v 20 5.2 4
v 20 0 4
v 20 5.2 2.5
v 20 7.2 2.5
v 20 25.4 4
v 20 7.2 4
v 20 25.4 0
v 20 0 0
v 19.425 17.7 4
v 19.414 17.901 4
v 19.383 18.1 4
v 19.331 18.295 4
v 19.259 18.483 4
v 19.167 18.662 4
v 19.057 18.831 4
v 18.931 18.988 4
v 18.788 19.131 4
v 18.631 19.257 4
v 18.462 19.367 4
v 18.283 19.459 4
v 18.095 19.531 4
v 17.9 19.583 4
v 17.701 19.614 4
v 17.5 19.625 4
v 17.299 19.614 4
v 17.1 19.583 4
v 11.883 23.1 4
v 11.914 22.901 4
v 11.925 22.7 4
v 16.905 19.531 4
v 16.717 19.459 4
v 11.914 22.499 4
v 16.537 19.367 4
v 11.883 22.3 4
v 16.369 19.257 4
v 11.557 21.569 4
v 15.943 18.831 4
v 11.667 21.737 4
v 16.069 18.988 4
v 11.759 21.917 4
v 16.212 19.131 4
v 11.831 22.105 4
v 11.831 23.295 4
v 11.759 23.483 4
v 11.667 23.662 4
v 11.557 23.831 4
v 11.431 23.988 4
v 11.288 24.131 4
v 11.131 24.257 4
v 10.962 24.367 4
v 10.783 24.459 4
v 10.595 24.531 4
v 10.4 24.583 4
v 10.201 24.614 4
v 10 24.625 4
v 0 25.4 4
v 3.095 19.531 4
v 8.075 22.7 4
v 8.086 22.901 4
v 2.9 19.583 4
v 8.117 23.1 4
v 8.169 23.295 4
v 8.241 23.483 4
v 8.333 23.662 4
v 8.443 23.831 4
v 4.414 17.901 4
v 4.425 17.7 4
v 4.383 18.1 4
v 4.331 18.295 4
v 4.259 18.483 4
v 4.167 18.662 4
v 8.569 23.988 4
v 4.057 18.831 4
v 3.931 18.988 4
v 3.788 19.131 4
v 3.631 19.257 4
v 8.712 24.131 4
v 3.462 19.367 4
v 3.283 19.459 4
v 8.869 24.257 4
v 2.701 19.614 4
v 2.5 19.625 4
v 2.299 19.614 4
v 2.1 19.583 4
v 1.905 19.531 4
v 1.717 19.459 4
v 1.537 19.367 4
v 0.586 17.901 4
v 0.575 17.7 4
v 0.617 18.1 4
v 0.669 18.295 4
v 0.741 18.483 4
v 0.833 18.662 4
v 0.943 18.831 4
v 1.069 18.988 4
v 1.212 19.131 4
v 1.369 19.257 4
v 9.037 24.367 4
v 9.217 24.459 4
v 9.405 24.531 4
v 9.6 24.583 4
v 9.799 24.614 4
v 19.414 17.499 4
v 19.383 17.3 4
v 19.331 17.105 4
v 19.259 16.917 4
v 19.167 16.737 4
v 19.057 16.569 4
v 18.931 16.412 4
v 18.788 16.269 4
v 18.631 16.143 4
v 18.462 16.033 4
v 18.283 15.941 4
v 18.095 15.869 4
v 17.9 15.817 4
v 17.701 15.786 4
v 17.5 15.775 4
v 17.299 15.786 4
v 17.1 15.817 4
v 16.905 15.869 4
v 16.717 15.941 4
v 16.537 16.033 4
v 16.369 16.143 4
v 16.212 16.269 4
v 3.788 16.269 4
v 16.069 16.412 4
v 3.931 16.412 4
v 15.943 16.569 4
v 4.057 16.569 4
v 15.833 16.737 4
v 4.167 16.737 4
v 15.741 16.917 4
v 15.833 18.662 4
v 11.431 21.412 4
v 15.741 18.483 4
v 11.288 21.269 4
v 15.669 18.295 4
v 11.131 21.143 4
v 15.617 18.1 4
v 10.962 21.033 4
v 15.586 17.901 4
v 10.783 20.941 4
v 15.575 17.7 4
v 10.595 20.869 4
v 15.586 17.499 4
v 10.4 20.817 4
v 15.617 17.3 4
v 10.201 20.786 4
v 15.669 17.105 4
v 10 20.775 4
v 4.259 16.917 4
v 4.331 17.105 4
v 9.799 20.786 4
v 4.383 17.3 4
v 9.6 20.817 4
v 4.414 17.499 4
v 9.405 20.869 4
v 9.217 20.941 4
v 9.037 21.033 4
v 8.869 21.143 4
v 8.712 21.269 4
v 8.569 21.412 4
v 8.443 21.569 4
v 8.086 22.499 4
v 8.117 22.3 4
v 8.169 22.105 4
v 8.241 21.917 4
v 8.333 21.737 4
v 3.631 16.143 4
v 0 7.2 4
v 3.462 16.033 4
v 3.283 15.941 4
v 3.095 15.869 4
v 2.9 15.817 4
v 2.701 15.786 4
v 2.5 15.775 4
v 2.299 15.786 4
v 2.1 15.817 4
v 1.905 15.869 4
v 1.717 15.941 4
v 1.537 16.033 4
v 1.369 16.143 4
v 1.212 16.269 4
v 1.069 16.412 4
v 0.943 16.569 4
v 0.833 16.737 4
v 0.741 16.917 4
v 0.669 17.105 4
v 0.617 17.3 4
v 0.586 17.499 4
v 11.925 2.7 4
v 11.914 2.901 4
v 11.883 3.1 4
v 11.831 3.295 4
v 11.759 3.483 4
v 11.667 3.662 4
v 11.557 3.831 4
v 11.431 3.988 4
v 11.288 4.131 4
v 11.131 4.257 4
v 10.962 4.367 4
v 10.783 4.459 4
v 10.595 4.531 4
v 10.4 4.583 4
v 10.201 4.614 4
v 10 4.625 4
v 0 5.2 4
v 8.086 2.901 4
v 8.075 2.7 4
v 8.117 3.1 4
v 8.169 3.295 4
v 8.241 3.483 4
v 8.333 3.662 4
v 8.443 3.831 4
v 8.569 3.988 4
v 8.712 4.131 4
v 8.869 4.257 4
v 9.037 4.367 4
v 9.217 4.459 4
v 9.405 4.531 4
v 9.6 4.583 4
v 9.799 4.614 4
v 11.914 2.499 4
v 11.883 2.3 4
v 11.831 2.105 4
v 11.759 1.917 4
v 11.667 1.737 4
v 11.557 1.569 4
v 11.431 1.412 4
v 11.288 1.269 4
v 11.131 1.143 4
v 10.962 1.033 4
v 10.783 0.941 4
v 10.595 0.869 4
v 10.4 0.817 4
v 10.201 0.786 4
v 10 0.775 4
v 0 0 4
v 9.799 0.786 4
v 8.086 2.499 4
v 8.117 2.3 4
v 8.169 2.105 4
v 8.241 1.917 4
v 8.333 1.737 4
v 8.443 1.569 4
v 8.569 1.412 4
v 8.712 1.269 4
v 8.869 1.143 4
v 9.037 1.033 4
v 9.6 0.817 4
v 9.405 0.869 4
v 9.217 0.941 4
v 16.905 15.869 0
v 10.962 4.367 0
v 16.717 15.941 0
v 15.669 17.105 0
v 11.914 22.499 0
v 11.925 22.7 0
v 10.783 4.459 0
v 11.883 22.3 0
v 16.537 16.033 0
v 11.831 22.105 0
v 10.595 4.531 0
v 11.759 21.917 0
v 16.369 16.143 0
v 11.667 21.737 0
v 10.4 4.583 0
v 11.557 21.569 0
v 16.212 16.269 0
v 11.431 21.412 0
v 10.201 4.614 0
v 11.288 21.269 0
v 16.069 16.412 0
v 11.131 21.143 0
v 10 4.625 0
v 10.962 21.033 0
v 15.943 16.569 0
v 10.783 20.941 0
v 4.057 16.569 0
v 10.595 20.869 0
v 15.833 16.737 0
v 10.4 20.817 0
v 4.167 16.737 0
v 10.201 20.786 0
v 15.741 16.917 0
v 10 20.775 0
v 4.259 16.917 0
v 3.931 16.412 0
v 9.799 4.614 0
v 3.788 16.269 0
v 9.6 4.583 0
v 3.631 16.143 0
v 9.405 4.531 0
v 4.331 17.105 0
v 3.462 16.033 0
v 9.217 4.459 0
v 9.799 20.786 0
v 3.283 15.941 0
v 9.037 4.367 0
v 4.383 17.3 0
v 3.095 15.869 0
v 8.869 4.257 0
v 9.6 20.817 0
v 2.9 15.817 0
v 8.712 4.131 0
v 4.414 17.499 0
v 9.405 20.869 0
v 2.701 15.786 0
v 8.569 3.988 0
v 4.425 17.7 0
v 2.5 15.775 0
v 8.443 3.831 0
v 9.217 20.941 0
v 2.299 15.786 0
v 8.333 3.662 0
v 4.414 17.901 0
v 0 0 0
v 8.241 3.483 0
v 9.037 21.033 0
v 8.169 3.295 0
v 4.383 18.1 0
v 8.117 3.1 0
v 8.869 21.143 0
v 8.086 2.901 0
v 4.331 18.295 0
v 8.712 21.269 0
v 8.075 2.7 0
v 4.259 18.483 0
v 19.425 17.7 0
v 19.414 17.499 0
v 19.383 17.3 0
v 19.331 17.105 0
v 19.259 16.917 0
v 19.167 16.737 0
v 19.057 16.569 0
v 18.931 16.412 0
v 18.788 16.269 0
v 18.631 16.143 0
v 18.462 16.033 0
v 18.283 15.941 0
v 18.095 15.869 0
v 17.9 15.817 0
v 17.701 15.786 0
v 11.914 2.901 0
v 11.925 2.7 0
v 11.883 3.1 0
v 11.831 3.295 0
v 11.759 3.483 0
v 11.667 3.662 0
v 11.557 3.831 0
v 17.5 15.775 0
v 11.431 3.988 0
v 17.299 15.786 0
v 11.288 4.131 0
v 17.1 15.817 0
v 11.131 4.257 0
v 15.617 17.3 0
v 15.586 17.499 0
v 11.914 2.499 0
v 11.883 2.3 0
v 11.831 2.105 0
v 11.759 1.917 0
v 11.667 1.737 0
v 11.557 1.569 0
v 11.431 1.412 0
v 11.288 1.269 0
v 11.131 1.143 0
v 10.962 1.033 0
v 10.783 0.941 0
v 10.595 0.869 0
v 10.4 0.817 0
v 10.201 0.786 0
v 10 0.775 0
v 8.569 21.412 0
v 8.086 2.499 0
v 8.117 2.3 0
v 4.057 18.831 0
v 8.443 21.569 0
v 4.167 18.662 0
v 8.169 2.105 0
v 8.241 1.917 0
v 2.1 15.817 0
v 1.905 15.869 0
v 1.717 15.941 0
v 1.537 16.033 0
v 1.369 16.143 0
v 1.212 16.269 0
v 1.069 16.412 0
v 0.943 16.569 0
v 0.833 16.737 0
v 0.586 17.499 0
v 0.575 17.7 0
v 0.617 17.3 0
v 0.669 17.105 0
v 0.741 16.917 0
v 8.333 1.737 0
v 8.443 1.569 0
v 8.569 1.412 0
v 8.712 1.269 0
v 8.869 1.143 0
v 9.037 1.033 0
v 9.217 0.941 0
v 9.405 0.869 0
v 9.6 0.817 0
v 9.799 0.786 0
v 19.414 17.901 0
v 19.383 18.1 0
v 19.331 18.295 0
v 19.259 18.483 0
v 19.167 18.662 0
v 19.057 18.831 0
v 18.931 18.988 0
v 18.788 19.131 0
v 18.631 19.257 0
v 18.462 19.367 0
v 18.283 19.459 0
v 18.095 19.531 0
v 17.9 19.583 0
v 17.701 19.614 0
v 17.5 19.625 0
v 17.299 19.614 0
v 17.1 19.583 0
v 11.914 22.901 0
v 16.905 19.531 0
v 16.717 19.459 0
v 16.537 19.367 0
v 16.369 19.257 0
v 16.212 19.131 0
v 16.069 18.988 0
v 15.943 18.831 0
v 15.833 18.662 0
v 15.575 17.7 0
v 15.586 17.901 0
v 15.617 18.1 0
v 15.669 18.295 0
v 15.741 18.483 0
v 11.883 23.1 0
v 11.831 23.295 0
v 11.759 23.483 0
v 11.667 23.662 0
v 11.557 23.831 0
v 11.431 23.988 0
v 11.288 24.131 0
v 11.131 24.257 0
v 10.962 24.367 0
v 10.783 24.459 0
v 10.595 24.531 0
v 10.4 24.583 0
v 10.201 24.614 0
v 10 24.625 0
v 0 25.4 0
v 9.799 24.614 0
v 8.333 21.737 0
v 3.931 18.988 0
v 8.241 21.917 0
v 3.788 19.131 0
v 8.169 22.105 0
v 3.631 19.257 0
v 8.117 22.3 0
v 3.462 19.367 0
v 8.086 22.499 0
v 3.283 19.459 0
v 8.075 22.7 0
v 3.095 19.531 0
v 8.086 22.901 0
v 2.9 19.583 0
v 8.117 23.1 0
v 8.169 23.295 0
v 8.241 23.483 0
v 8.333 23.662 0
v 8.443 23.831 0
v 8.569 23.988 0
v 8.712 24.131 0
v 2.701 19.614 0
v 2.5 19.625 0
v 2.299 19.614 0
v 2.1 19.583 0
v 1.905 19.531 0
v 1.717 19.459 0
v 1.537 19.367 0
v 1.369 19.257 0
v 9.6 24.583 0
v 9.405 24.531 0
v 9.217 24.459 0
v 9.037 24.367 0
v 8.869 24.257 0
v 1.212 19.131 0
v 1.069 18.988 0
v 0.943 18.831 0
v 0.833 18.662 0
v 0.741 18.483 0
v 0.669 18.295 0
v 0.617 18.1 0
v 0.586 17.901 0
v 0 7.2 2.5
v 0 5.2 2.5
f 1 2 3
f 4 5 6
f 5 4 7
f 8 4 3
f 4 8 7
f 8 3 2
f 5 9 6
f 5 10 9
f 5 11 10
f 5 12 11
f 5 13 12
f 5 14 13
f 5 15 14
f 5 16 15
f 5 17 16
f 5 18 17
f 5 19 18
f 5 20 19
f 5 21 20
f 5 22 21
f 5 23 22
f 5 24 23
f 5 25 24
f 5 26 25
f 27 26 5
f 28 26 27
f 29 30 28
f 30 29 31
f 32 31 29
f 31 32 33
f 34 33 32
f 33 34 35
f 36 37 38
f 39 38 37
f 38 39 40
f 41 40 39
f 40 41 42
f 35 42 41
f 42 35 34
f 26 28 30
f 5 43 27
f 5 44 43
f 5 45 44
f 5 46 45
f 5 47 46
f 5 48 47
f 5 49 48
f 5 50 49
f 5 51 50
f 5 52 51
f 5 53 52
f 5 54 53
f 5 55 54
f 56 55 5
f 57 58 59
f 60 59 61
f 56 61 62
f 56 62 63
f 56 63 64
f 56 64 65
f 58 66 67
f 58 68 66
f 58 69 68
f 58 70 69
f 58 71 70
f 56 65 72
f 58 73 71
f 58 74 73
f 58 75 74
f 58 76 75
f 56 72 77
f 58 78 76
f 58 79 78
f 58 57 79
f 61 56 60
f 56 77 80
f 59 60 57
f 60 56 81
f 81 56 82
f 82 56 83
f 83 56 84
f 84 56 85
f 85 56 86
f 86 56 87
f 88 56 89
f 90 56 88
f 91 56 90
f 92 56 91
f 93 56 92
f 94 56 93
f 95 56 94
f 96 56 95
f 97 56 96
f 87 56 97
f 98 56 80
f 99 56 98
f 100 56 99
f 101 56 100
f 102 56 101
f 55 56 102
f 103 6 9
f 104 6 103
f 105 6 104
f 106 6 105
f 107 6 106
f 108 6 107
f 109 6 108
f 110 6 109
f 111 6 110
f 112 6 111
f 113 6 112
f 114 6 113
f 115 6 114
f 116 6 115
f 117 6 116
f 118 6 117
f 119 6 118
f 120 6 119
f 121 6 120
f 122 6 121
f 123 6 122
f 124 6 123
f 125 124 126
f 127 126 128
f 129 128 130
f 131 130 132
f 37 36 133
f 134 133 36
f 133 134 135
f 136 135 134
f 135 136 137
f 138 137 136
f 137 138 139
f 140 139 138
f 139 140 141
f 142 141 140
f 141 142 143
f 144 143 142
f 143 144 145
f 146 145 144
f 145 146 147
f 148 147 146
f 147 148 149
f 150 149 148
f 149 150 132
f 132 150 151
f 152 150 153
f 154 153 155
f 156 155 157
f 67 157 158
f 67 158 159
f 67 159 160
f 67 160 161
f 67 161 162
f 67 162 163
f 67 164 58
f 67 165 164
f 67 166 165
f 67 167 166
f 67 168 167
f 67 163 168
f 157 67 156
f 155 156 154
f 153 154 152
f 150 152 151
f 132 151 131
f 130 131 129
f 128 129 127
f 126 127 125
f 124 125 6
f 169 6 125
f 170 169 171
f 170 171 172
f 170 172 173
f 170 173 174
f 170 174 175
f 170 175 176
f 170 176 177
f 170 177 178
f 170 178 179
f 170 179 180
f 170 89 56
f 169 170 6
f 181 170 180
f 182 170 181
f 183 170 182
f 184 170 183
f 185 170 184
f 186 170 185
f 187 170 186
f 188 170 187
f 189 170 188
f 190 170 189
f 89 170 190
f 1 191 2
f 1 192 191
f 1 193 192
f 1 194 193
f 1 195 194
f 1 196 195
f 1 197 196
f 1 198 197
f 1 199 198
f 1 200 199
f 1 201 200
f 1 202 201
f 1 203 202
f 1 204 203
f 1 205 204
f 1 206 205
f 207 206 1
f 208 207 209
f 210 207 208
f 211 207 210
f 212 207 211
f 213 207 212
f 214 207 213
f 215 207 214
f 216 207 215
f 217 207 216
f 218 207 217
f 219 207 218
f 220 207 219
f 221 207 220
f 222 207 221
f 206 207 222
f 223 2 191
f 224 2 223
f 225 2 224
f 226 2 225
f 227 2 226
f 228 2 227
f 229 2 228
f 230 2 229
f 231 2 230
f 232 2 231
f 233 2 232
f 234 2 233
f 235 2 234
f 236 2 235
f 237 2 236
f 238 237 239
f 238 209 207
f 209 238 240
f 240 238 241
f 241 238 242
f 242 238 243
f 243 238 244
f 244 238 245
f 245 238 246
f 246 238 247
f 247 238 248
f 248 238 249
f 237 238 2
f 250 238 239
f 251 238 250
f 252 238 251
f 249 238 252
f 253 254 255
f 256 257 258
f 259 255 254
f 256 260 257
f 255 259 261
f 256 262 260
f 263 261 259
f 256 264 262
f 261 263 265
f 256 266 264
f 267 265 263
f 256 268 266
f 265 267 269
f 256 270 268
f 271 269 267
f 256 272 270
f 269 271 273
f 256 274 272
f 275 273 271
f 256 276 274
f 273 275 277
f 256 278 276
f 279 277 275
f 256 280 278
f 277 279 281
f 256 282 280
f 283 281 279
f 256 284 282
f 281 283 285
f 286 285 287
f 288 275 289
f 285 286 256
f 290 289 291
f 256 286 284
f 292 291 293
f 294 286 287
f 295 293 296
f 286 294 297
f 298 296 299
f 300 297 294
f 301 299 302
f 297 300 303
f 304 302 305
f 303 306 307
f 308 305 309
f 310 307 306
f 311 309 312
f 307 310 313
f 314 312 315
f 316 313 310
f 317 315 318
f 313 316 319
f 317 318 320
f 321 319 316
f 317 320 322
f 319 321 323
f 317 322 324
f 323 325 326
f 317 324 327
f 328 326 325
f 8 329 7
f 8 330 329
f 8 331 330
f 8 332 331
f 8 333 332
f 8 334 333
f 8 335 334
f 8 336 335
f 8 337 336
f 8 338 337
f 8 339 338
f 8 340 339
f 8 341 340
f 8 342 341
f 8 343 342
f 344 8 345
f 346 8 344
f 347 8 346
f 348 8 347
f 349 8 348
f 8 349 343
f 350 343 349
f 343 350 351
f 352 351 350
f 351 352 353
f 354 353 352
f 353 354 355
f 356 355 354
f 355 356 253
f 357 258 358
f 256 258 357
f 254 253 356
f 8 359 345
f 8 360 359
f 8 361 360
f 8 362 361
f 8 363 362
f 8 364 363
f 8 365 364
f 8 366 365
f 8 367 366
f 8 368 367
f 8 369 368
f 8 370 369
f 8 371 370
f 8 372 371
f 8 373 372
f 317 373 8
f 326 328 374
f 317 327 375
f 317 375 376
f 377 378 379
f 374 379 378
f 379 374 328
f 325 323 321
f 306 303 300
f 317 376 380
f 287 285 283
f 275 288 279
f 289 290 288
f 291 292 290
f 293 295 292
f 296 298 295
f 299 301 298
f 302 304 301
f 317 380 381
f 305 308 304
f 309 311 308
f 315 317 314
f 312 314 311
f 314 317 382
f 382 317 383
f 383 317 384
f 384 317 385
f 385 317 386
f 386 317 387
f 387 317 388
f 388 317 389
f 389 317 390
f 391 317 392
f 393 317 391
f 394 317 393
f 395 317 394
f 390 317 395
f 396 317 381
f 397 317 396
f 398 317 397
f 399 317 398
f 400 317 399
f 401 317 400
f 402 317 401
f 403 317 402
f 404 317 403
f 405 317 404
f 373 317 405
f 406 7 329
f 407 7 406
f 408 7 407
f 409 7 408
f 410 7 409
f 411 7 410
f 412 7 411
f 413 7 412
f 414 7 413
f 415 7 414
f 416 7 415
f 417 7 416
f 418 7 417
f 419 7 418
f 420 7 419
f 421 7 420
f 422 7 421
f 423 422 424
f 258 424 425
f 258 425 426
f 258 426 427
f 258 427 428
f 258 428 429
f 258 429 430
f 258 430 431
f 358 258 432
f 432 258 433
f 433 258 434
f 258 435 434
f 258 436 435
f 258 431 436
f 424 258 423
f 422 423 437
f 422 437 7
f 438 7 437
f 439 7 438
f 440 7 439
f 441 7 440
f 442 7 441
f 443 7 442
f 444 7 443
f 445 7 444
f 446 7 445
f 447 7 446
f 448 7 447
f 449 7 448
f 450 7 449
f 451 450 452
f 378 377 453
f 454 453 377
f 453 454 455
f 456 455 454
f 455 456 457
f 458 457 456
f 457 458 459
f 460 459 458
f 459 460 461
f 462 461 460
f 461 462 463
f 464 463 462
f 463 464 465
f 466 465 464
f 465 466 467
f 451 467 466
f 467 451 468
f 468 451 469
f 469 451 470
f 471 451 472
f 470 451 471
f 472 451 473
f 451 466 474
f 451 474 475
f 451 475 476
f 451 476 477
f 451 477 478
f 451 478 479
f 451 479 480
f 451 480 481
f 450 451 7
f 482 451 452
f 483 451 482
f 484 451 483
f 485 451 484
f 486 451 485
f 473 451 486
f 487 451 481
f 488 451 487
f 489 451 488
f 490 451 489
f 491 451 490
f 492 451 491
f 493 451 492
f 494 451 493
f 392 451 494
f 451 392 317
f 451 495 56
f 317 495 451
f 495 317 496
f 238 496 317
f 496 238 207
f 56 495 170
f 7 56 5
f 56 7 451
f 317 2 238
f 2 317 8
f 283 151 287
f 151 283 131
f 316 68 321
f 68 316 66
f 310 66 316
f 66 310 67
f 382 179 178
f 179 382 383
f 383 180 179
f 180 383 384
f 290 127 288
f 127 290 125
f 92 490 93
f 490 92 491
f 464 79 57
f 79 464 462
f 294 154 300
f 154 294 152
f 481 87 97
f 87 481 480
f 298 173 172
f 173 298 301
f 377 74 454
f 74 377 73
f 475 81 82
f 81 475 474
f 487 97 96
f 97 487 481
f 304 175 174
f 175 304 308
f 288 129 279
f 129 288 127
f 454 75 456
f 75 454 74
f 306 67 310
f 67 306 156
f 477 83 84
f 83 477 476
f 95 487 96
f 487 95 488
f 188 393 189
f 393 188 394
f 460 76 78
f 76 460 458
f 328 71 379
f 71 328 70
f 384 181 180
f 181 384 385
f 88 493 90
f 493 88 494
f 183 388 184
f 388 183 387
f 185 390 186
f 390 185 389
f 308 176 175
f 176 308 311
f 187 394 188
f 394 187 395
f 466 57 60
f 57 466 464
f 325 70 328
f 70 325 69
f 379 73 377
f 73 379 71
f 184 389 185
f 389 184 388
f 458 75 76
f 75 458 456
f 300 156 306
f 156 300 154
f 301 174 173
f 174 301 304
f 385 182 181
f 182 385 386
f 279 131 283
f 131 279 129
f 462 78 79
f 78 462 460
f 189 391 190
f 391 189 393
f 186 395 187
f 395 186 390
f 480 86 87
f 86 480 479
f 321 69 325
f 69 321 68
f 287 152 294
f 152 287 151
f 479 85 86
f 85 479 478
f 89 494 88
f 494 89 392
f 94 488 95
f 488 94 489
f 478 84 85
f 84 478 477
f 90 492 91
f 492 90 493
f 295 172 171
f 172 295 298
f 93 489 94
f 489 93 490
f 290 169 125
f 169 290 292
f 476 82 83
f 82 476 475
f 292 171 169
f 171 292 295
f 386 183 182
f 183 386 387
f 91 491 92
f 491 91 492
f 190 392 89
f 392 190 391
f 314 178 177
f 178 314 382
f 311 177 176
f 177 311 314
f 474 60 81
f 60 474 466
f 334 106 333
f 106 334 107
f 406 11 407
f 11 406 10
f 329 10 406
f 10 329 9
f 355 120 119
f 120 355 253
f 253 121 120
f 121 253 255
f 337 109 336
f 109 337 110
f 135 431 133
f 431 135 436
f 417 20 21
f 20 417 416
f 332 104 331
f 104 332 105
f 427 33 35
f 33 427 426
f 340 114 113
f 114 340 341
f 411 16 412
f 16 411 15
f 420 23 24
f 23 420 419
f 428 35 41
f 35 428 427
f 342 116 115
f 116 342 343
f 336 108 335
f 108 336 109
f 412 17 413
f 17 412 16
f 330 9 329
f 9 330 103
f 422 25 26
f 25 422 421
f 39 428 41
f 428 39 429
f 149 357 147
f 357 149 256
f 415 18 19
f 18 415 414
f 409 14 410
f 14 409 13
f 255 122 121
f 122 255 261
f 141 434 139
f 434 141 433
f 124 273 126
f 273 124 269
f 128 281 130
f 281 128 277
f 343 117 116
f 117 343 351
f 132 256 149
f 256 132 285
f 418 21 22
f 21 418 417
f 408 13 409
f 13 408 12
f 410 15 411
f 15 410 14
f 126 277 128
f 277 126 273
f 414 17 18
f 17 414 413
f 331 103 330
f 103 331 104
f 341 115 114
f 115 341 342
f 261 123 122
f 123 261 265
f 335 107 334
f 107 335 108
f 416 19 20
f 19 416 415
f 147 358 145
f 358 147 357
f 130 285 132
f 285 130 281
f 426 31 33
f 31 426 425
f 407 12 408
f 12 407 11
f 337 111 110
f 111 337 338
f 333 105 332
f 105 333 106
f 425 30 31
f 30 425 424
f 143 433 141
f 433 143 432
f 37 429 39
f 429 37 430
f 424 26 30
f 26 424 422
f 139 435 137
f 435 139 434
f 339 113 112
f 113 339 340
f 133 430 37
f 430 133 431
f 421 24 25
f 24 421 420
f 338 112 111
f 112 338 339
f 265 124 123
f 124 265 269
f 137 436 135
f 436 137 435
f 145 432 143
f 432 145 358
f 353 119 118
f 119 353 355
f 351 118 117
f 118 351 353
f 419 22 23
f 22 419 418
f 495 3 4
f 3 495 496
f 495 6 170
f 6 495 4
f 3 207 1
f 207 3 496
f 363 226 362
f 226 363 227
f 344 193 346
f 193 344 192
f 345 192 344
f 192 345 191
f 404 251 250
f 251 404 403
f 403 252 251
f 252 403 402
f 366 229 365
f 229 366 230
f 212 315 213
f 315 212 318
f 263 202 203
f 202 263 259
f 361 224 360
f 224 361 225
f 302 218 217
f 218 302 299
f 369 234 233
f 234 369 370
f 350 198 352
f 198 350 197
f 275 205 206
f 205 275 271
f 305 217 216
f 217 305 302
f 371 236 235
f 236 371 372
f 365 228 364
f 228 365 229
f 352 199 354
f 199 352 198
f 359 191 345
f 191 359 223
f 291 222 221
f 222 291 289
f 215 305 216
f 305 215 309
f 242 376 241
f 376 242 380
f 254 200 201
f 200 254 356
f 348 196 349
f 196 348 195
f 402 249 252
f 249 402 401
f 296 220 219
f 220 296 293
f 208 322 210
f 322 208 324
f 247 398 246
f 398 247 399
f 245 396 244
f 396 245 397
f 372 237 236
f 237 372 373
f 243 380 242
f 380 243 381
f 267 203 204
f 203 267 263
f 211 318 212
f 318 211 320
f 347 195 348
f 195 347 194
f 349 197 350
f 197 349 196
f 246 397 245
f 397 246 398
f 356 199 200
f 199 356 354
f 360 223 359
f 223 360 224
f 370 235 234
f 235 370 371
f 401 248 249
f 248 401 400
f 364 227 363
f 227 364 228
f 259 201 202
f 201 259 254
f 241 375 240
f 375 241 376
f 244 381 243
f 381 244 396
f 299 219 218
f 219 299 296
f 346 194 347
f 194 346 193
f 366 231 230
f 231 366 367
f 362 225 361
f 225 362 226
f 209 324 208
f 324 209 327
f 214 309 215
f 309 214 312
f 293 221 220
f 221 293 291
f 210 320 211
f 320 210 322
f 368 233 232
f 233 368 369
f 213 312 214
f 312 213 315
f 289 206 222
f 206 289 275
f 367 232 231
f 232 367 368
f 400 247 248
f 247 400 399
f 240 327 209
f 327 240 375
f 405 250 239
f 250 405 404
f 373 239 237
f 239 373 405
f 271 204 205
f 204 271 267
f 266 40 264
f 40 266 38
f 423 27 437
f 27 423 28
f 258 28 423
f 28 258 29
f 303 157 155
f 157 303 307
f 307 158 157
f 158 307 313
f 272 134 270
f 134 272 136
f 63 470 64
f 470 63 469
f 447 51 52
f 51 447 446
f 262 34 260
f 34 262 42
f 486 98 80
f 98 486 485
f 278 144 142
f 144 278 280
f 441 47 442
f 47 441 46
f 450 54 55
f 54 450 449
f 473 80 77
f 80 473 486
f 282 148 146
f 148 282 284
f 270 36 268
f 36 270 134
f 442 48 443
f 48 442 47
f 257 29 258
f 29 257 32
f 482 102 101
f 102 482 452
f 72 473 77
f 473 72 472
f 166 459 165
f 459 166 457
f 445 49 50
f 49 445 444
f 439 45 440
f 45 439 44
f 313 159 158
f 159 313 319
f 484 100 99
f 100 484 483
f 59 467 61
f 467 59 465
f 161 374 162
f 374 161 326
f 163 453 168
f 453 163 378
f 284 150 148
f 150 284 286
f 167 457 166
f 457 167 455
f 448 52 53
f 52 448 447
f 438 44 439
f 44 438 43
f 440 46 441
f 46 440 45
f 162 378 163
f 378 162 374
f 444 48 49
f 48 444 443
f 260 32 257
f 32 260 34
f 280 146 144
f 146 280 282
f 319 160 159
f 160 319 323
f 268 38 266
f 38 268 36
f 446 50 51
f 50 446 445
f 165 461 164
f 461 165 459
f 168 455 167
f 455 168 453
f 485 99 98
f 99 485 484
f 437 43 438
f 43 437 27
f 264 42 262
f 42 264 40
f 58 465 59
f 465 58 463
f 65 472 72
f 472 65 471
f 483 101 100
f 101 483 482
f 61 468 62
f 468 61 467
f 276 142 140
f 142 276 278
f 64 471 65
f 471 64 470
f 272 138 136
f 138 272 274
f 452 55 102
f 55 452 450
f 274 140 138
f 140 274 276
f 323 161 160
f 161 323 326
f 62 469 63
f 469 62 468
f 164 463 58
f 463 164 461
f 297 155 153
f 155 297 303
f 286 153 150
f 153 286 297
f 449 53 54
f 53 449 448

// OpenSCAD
// file: metric_screw_sizes.scad
//sizes for metric screws that work
m3_clearance = 3.85;
m3_tight = 3.5;
m3_cap_clear = 6;
m3_cap_depth = 3.3;
m3_nut_clear = 7;
// main file
//MPU-6050 holder, horizontal
$fn = 60;
include <metric_screw_sizes.scad>
module_width = 20;
module_depth = 15;
mount_hole_dia = 3.2;
mount_hole_sep = 15;
mount_hole_depth = (module_width - mount_hole_sep)/2;
mount_height = 4; //thickness of the base
mount_width = 20;
mount_depth = 20 + 3 + 2.4; //center-to-center hole pattern, plus a hole, plus 2 walls
top_of_module = mount_depth - (mount_depth - module_depth)/2;

difference(){
    //main body + module
    union(){
        cube([mount_width, mount_depth, mount_height]);
//        translate([0, (mount_depth - module_depth)/2, mount_height])
//            cube([module_width, module_depth, 1.5]);
    }
    //module mount holes
    translate([mount_width/2-mount_hole_sep/2, top_of_module-mount_hole_depth, 0])
        cylinder(h = mount_depth, r = m3_clearance/2);
    translate([mount_width/2+mount_hole_sep/2, top_of_module-mount_hole_depth, 0])
        cylinder(h = mount_depth, r = m3_clearance/2);
    //header backside clearance
    translate([0, (mount_depth - module_depth)/2, mount_height-1.5])
        cube([mount_width, 2, 1.5]);
    //mount to plate holes
    translate([mount_width/2, mount_depth/2-10, 0])
        cylinder(h = mount_depth, r = m3_clearance/2);
    translate([mount_width/2, mount_depth/2+10, 0])
        cylinder(h = mount_depth, r = m3_clearance/2);
}
